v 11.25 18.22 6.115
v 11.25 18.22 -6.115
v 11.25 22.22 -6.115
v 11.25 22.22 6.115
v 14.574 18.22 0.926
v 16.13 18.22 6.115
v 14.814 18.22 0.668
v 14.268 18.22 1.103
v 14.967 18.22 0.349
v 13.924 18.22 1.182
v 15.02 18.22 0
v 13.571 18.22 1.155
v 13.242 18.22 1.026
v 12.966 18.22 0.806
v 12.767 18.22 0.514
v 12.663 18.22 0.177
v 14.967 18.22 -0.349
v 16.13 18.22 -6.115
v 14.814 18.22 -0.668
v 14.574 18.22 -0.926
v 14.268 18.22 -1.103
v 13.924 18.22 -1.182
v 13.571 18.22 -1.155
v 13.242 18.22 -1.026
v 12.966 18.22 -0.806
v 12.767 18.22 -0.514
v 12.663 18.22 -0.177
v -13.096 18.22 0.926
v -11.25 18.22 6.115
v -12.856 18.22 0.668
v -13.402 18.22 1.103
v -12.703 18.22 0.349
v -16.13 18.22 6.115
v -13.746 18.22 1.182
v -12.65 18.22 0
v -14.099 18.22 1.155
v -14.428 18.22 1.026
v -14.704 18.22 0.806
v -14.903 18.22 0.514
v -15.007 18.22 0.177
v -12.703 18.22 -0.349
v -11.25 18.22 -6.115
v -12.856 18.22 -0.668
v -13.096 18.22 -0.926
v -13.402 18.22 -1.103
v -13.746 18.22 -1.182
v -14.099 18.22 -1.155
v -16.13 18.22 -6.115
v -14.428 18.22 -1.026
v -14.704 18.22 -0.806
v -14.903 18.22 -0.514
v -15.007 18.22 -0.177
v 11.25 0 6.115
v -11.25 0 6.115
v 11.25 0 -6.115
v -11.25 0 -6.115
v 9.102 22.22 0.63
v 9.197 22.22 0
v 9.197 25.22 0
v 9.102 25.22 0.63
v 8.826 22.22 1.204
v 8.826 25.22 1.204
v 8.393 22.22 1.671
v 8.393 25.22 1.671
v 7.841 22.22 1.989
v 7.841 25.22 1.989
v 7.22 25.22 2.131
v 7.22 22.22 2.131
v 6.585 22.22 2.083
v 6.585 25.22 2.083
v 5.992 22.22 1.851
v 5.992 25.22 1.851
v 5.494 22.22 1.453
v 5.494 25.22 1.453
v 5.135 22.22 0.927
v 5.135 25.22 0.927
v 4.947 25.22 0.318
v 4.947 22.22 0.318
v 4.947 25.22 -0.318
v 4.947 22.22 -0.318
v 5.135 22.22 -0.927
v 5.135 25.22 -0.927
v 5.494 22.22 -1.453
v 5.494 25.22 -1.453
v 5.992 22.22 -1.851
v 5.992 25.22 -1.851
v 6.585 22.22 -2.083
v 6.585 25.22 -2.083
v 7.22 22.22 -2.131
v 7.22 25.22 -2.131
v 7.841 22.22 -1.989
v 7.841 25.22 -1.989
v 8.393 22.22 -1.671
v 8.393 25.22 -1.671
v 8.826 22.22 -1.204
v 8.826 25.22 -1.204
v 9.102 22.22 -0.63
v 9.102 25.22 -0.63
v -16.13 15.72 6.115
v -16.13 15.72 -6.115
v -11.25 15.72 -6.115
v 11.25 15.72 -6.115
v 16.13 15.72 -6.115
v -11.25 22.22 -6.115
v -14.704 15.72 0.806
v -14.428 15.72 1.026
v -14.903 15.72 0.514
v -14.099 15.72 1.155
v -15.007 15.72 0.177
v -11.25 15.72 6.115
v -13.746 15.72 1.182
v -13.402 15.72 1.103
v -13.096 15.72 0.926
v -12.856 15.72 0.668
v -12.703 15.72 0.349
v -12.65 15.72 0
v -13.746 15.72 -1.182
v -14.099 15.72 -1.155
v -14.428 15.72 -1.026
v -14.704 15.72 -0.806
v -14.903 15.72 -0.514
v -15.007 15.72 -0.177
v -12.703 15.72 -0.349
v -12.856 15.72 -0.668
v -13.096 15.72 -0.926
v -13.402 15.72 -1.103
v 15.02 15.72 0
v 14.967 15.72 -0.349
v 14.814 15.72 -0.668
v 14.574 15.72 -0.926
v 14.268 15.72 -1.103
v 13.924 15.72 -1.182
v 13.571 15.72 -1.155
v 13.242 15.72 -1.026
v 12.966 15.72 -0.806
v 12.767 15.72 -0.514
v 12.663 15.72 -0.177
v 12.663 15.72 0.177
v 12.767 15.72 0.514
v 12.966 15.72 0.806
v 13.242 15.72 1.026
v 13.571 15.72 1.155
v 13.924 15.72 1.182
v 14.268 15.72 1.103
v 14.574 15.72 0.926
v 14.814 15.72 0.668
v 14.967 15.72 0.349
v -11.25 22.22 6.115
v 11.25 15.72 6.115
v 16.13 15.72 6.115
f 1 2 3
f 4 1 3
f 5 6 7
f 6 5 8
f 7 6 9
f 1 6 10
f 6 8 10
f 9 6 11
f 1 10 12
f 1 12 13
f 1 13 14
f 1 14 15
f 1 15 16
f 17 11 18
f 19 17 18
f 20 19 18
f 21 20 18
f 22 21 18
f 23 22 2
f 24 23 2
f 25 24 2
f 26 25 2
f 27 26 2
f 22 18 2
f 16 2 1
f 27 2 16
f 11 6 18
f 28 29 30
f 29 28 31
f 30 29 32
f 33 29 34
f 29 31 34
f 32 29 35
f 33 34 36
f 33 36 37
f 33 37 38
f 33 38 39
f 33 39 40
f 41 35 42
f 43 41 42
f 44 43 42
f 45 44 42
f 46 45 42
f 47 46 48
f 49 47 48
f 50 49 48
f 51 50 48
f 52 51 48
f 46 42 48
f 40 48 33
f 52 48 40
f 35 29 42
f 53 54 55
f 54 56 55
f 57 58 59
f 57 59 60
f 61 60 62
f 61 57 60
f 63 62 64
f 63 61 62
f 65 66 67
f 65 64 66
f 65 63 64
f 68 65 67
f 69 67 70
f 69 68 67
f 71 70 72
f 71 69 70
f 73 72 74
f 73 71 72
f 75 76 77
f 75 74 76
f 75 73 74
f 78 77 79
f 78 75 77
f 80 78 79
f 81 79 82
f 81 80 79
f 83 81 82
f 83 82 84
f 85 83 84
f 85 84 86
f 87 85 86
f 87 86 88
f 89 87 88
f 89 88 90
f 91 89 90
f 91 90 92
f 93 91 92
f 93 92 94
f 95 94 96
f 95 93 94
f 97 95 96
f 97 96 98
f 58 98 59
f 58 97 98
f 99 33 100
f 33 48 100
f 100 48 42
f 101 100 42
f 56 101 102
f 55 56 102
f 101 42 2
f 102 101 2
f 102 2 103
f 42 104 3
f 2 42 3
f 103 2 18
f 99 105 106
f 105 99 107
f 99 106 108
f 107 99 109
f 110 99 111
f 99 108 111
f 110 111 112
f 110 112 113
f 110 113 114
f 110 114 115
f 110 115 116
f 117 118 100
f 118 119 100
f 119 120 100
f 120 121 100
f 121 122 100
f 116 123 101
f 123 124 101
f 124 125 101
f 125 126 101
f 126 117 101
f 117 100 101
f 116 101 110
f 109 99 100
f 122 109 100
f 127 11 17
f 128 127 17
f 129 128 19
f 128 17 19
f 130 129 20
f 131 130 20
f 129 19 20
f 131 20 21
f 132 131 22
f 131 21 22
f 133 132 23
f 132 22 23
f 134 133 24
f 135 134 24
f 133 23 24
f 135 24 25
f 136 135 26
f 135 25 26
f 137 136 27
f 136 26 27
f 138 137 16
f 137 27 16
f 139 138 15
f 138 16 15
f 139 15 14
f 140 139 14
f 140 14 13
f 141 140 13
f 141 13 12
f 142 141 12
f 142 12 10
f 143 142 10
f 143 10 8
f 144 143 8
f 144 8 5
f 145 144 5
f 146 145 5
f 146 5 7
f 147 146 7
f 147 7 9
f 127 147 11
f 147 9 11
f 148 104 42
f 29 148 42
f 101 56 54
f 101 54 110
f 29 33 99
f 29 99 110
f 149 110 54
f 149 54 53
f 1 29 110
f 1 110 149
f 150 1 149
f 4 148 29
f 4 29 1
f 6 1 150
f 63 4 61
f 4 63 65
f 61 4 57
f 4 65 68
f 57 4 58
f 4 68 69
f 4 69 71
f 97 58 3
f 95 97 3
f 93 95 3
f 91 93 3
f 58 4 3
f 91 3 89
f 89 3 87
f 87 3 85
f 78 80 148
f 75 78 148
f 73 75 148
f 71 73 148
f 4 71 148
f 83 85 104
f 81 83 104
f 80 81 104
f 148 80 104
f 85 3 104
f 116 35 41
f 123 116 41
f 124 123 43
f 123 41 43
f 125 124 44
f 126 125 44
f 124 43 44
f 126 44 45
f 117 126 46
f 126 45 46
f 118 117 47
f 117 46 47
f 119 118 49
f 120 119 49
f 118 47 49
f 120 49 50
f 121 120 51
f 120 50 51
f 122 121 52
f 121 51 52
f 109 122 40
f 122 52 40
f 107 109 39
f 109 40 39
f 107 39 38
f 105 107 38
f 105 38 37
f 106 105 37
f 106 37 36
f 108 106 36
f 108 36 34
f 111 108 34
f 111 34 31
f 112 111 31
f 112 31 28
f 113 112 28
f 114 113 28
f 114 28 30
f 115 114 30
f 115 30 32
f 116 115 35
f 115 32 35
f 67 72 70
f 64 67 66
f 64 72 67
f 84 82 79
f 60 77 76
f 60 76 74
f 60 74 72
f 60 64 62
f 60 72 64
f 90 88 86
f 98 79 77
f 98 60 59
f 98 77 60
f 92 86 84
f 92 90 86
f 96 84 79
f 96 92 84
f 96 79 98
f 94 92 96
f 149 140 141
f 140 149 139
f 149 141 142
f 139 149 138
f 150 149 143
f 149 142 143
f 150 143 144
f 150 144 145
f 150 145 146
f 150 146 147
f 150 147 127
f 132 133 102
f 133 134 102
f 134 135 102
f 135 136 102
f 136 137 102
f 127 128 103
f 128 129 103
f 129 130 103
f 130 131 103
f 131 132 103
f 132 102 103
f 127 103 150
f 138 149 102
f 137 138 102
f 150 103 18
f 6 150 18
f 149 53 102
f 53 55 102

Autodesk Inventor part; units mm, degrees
ref_plane "YZ Plane" through (0, 0, 0) normal (1, 0, 0) x (0, 1, 0)
ref_plane "XZ Plane" through (0, 0, 0) normal (0, 1, 0) x (-1, 0, 0)
ref_plane "XY Plane" through (0, 0, 0) normal (0, 0, 1) x (1, 0, 0)
sketch "Sketch1" plane through (0, 0, 0) normal (0, 0, 1) x (1, 0, 0)
  line L0 (-11.25, 0) -> (11.25, 0)
  line L1 (11.25, 0) -> (11.25, 15.72)
  line L2 (11.25, 15.72) -> (16.13, 15.72)
  line L3 (16.13, 15.72) -> (16.13, 18.22)
  line L4 (16.13, 18.22) -> (11.25, 18.22)
  line L5 (11.25, 18.22) -> (11.25, 22.22)
  line L6 (11.25, 22.22) -> (-11.25, 22.22)
  line L7 (-11.25, 22.22) -> (-11.25, 18.22)
  line L8 (-11.25, 18.22) -> (-16.13, 18.22)
  line L9 (-16.13, 18.22) -> (-16.13, 15.72)
  line L10 (-16.13, 15.72) -> (-11.25, 15.72)
  line L11 (-11.25, 0) -> (-11.25, 15.72)
  point P0 (0, 0)
  point P1 (0, 0)
  dimension "d0" = 22.5
  dimension "d1" = 15.72
  dimension "d2" = 4.88
  dimension "d3" = 2.5
  dimension "d4" = 4
  dimension "d5" = 4.88
extrude "Extrusion1" add sketch "Sketch1" along normal mid plane 12.23
sketch "Sketch2" plane through (-16.13, 18.22, 6.115) normal (0, 1, 0) x (1, 0, 0)
  line L0 (4.88, 12.23) -> (4.88, 0) projected
  line L1 (27.38, 0) -> (4.88, 0) projected
  line L2 (27.38, 12.23) -> (27.38, 0) projected
  line L3 (4.88, 12.23) -> (27.38, 12.23) projected
  line L4 (27.38, 0) -> (4.88, 0) projected
  line L5 (16.13, 0) -> (16.13, 12.23) construction
  line L6 (4.88, 6.115) -> (27.38, 6.115) construction
  circle A0 centre (2.295, 6.115) radius 1.185
  line L7 (27.38, 6.115) -> (4.88, 6.115) construction
  circle A1 centre (29.965, 6.115) radius 1.185
  point P0 (16.13, 6.115)
  dimension "d8" = 2.37
  dimension "d9" = 27.67
sketch "Sketch3" plane through (-11.25, 22.22, 6.115) normal (0, 1, 0) x (1, 0, 0)
  circle A0 centre (18.3104, 6.115) radius 2.1368
  point P0 (11.25, 6.115)
  dimension "d10" = 4.2736
extrude "Extrusion2" cut sketch "Sketch2" against normal up to next contours A0 | A1
extrude "Extrusion3" add sketch "Sketch3" along normal blind 3
sketch "Sketch4" plane through (-11.25, 0, 6.115) normal (0, -1, 0) x (1, 0, 0)
  circle A0 centre (-2.585, -6.115) radius 1.185 projected
  circle A1 centre (25.085, -6.115) radius 1.185 projected
  line L0 (22.5, -12.23) -> (22.5, 0) projected
  line L1 (0, 0) -> (22.5, 0) projected
  line L2 (0, 0) -> (0, -12.23) projected
  line L3 (22.5, -12.23) -> (0, -12.23) projected
  line L4 (0, -12.23) -> (0, 0) projected
  line L5 (0, -6.115) -> (22.5, -6.115) construction
  line L6 (11.25, 0) -> (11.25, -12.23) construction
  circle A2 centre (18.3104, -6.115) radius 2.1368 projected
  point P0 (11.25, -6.115)
properties part number "micro_servo"
